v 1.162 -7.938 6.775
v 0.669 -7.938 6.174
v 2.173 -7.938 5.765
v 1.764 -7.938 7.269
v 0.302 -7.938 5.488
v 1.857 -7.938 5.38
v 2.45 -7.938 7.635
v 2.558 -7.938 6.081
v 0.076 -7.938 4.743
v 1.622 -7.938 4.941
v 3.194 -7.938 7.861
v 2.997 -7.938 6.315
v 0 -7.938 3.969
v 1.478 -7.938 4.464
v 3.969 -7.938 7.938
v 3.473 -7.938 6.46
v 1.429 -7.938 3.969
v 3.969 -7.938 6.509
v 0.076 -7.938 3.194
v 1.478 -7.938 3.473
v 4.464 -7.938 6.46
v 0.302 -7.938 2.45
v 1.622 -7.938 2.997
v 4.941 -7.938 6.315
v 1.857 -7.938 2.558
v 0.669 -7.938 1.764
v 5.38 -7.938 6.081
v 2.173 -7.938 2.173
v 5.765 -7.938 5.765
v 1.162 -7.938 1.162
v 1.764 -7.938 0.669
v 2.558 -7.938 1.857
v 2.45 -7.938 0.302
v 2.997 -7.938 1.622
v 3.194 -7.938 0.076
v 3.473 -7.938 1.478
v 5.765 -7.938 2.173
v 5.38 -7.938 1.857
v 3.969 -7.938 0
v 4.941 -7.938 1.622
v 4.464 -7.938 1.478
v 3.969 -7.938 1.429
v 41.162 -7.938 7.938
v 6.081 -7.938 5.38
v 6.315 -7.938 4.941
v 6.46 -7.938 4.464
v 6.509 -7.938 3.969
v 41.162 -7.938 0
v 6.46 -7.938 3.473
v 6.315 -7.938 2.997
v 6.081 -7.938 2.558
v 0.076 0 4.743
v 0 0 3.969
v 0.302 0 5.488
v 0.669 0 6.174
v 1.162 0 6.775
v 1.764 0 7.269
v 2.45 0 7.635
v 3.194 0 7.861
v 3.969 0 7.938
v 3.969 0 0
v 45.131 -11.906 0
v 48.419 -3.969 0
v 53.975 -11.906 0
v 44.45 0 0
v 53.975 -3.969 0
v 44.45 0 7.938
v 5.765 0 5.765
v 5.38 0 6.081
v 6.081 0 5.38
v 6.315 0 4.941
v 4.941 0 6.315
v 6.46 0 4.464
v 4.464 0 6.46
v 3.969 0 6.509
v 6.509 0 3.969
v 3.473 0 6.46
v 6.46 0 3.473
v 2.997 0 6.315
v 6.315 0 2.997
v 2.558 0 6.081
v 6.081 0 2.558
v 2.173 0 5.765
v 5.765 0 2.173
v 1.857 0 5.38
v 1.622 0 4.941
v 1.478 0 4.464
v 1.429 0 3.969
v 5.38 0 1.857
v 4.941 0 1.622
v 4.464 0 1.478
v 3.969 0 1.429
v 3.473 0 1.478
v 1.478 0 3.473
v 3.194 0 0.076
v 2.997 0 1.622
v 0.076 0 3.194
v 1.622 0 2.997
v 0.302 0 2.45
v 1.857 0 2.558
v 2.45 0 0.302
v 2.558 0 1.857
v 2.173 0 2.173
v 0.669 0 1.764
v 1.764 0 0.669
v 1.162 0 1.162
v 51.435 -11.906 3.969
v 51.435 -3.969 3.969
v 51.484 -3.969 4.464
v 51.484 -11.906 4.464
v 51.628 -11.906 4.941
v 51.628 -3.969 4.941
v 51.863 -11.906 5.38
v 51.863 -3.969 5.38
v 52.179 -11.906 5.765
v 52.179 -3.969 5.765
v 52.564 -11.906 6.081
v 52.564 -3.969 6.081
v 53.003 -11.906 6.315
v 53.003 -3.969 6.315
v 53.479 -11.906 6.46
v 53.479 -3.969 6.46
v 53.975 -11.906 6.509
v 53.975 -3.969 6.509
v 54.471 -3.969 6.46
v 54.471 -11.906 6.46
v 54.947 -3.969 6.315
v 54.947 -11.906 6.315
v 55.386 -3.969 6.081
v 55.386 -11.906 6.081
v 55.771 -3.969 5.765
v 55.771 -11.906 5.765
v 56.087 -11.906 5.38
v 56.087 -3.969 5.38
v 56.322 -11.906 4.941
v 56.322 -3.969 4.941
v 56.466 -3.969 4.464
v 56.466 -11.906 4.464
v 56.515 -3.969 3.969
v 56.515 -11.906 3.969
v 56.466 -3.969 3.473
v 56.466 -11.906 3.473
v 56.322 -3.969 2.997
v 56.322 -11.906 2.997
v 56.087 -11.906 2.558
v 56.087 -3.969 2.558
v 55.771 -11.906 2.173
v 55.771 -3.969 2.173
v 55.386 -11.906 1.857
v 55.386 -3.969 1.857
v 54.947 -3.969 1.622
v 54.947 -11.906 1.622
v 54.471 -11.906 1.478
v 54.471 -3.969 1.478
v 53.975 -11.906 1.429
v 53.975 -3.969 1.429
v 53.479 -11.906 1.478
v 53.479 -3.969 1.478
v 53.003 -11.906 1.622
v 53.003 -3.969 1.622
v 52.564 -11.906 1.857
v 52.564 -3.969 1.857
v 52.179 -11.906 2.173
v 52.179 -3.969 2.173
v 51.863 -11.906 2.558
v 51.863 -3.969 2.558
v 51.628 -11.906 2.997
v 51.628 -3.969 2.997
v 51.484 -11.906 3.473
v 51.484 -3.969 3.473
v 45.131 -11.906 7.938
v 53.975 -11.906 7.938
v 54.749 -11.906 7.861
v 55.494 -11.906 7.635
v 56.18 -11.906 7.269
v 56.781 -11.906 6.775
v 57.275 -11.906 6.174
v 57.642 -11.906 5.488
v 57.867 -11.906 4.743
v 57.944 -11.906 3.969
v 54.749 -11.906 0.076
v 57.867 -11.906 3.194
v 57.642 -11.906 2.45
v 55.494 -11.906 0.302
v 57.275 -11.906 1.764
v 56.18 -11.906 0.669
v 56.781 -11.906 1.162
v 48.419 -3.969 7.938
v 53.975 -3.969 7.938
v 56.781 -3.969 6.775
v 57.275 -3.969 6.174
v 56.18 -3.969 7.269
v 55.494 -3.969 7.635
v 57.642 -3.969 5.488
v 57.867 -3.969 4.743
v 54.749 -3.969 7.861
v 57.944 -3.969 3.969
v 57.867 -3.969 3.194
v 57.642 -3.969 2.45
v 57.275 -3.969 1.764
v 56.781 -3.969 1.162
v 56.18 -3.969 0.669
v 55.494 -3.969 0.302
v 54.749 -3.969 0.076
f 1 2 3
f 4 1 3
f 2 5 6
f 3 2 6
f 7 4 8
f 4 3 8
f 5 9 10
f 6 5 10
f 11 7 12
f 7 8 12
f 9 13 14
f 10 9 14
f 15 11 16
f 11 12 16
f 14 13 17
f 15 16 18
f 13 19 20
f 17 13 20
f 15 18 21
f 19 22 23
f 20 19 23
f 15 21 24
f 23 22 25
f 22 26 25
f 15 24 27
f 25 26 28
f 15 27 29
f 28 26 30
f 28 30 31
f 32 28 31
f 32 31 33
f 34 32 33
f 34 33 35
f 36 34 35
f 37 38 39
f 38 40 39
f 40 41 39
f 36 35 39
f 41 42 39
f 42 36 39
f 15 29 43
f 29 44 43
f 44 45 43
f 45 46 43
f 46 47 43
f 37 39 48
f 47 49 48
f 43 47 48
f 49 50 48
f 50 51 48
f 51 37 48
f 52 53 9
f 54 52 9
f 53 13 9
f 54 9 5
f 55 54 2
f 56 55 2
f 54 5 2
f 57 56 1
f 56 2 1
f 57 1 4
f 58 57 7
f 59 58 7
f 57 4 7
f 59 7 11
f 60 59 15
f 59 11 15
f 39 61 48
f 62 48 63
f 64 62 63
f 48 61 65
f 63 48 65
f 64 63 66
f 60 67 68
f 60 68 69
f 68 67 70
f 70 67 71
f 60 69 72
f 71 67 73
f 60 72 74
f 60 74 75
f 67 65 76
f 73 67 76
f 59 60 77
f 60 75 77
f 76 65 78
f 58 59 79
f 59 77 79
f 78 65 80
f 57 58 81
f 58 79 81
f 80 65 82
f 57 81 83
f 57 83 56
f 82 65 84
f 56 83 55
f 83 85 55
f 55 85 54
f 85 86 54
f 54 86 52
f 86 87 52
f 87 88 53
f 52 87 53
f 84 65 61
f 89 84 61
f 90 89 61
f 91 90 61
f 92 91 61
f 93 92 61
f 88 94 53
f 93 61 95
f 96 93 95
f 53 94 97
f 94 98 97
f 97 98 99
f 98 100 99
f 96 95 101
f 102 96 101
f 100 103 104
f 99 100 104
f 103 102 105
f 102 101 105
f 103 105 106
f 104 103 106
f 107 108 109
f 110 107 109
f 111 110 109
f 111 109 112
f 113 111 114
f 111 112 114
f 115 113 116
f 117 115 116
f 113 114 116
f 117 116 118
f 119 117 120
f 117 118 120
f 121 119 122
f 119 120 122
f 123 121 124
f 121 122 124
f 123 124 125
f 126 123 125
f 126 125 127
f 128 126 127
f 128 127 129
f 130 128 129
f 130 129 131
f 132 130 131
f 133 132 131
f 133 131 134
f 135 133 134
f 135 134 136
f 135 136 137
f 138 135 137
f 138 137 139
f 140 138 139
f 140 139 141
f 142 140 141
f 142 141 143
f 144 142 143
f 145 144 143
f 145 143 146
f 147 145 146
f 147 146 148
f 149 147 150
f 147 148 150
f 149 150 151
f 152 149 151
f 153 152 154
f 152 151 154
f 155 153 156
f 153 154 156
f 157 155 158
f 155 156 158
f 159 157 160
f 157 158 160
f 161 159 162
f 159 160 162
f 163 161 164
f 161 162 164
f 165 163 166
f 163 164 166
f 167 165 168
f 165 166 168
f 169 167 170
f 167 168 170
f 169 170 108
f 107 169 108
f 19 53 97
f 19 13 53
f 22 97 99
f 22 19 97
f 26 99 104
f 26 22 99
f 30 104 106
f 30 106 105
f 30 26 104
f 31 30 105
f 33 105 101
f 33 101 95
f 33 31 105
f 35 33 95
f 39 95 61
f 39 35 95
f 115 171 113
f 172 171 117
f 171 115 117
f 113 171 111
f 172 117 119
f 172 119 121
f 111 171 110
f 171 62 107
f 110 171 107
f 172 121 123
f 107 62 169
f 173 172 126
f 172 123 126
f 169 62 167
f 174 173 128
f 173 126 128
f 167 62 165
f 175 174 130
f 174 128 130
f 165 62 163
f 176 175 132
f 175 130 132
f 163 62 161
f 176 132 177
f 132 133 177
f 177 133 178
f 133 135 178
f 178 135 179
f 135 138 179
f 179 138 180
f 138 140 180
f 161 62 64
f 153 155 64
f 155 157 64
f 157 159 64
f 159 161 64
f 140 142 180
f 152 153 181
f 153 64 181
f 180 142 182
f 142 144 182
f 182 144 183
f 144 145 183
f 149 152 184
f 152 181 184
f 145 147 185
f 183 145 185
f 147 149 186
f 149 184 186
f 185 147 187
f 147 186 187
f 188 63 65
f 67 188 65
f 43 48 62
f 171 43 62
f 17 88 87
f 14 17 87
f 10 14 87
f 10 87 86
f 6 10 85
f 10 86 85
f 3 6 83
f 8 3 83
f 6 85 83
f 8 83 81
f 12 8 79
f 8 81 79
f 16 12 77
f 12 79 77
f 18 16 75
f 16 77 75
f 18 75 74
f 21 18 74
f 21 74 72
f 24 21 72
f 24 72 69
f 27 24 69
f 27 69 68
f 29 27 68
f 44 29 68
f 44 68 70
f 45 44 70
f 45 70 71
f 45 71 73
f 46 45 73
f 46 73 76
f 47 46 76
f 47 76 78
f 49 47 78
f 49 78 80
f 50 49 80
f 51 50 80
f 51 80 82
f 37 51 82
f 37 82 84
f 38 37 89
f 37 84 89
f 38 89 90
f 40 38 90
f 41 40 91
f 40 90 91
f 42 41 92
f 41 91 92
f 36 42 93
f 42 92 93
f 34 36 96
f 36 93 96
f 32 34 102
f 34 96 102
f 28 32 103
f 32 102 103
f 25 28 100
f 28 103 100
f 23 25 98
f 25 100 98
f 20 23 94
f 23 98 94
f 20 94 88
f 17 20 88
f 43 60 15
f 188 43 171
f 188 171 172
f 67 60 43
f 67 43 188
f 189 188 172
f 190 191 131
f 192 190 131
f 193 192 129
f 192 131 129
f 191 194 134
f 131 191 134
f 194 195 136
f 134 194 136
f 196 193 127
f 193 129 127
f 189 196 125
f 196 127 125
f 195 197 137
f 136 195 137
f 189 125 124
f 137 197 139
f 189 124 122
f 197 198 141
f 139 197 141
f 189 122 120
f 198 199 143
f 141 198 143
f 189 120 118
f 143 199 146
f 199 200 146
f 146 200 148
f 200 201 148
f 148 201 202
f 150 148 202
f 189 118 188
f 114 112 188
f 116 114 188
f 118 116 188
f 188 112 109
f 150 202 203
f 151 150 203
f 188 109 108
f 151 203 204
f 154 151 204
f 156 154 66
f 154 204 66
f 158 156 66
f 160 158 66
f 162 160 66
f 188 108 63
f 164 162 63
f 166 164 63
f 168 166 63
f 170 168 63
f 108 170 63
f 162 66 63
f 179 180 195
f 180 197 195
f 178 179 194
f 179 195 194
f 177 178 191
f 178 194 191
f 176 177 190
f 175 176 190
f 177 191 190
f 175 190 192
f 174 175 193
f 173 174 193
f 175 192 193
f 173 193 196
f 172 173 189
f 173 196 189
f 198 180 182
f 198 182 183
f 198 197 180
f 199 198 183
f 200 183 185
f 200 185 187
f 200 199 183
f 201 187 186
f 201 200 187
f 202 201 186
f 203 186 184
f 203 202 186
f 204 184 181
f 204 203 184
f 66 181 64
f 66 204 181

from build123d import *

# Parameters (mm, degrees)
F1_DEPTH = 7.9375
F2_R     = 3.96874
F3_R     = 2.54
F4_DEPTH = 11.90625


# Not quite as in the source:
# - a fillet or chamfer is up to 0.001 mm smaller than in the source, because OpenCascade refuses the exact size


with BuildPart() as f1:
    # F0 (on Top) → F1 (new body)
    with BuildSketch(Plane.XY):
        Polygon((44.45, 0), (0, 0), (0, -7.9375), (41.1621798487, -7.9375), (45.1309298487, -11.90625), (57.94375, -11.90625), (57.94375, -3.96875), (48.41875, -3.96875), align=None)
    extrude(amount=F1_DEPTH)

    # F2 (radius 3.96875 in the source; OpenCascade refuses exactly that, so slightly less here)
    f2_edges = [f1.edges().sort_by_distance(p)[0] for p in [
        (0, -3.96875, 0),
        (0, -3.96875, 7.9375),
        (57.94375, -7.9375, 0),
        (57.94375, -7.9375, 7.9375),
    ]]
    fillet(f2_edges, radius=F2_R)

    # F3 (on face) → F4 (cut, through all)
    with BuildSketch(Plane(origin=(0, 0, 0), x_dir=(-1, 0, 0), z_dir=(0, 1, 0))):
        with Locations((-3.96875, 3.96875)):
            Circle(F3_R)
        with Locations((-53.975, 3.96875)):
            Circle(F3_R)
    extrude(amount=-F4_DEPTH, mode=Mode.SUBTRACT)


solid = f1.part
